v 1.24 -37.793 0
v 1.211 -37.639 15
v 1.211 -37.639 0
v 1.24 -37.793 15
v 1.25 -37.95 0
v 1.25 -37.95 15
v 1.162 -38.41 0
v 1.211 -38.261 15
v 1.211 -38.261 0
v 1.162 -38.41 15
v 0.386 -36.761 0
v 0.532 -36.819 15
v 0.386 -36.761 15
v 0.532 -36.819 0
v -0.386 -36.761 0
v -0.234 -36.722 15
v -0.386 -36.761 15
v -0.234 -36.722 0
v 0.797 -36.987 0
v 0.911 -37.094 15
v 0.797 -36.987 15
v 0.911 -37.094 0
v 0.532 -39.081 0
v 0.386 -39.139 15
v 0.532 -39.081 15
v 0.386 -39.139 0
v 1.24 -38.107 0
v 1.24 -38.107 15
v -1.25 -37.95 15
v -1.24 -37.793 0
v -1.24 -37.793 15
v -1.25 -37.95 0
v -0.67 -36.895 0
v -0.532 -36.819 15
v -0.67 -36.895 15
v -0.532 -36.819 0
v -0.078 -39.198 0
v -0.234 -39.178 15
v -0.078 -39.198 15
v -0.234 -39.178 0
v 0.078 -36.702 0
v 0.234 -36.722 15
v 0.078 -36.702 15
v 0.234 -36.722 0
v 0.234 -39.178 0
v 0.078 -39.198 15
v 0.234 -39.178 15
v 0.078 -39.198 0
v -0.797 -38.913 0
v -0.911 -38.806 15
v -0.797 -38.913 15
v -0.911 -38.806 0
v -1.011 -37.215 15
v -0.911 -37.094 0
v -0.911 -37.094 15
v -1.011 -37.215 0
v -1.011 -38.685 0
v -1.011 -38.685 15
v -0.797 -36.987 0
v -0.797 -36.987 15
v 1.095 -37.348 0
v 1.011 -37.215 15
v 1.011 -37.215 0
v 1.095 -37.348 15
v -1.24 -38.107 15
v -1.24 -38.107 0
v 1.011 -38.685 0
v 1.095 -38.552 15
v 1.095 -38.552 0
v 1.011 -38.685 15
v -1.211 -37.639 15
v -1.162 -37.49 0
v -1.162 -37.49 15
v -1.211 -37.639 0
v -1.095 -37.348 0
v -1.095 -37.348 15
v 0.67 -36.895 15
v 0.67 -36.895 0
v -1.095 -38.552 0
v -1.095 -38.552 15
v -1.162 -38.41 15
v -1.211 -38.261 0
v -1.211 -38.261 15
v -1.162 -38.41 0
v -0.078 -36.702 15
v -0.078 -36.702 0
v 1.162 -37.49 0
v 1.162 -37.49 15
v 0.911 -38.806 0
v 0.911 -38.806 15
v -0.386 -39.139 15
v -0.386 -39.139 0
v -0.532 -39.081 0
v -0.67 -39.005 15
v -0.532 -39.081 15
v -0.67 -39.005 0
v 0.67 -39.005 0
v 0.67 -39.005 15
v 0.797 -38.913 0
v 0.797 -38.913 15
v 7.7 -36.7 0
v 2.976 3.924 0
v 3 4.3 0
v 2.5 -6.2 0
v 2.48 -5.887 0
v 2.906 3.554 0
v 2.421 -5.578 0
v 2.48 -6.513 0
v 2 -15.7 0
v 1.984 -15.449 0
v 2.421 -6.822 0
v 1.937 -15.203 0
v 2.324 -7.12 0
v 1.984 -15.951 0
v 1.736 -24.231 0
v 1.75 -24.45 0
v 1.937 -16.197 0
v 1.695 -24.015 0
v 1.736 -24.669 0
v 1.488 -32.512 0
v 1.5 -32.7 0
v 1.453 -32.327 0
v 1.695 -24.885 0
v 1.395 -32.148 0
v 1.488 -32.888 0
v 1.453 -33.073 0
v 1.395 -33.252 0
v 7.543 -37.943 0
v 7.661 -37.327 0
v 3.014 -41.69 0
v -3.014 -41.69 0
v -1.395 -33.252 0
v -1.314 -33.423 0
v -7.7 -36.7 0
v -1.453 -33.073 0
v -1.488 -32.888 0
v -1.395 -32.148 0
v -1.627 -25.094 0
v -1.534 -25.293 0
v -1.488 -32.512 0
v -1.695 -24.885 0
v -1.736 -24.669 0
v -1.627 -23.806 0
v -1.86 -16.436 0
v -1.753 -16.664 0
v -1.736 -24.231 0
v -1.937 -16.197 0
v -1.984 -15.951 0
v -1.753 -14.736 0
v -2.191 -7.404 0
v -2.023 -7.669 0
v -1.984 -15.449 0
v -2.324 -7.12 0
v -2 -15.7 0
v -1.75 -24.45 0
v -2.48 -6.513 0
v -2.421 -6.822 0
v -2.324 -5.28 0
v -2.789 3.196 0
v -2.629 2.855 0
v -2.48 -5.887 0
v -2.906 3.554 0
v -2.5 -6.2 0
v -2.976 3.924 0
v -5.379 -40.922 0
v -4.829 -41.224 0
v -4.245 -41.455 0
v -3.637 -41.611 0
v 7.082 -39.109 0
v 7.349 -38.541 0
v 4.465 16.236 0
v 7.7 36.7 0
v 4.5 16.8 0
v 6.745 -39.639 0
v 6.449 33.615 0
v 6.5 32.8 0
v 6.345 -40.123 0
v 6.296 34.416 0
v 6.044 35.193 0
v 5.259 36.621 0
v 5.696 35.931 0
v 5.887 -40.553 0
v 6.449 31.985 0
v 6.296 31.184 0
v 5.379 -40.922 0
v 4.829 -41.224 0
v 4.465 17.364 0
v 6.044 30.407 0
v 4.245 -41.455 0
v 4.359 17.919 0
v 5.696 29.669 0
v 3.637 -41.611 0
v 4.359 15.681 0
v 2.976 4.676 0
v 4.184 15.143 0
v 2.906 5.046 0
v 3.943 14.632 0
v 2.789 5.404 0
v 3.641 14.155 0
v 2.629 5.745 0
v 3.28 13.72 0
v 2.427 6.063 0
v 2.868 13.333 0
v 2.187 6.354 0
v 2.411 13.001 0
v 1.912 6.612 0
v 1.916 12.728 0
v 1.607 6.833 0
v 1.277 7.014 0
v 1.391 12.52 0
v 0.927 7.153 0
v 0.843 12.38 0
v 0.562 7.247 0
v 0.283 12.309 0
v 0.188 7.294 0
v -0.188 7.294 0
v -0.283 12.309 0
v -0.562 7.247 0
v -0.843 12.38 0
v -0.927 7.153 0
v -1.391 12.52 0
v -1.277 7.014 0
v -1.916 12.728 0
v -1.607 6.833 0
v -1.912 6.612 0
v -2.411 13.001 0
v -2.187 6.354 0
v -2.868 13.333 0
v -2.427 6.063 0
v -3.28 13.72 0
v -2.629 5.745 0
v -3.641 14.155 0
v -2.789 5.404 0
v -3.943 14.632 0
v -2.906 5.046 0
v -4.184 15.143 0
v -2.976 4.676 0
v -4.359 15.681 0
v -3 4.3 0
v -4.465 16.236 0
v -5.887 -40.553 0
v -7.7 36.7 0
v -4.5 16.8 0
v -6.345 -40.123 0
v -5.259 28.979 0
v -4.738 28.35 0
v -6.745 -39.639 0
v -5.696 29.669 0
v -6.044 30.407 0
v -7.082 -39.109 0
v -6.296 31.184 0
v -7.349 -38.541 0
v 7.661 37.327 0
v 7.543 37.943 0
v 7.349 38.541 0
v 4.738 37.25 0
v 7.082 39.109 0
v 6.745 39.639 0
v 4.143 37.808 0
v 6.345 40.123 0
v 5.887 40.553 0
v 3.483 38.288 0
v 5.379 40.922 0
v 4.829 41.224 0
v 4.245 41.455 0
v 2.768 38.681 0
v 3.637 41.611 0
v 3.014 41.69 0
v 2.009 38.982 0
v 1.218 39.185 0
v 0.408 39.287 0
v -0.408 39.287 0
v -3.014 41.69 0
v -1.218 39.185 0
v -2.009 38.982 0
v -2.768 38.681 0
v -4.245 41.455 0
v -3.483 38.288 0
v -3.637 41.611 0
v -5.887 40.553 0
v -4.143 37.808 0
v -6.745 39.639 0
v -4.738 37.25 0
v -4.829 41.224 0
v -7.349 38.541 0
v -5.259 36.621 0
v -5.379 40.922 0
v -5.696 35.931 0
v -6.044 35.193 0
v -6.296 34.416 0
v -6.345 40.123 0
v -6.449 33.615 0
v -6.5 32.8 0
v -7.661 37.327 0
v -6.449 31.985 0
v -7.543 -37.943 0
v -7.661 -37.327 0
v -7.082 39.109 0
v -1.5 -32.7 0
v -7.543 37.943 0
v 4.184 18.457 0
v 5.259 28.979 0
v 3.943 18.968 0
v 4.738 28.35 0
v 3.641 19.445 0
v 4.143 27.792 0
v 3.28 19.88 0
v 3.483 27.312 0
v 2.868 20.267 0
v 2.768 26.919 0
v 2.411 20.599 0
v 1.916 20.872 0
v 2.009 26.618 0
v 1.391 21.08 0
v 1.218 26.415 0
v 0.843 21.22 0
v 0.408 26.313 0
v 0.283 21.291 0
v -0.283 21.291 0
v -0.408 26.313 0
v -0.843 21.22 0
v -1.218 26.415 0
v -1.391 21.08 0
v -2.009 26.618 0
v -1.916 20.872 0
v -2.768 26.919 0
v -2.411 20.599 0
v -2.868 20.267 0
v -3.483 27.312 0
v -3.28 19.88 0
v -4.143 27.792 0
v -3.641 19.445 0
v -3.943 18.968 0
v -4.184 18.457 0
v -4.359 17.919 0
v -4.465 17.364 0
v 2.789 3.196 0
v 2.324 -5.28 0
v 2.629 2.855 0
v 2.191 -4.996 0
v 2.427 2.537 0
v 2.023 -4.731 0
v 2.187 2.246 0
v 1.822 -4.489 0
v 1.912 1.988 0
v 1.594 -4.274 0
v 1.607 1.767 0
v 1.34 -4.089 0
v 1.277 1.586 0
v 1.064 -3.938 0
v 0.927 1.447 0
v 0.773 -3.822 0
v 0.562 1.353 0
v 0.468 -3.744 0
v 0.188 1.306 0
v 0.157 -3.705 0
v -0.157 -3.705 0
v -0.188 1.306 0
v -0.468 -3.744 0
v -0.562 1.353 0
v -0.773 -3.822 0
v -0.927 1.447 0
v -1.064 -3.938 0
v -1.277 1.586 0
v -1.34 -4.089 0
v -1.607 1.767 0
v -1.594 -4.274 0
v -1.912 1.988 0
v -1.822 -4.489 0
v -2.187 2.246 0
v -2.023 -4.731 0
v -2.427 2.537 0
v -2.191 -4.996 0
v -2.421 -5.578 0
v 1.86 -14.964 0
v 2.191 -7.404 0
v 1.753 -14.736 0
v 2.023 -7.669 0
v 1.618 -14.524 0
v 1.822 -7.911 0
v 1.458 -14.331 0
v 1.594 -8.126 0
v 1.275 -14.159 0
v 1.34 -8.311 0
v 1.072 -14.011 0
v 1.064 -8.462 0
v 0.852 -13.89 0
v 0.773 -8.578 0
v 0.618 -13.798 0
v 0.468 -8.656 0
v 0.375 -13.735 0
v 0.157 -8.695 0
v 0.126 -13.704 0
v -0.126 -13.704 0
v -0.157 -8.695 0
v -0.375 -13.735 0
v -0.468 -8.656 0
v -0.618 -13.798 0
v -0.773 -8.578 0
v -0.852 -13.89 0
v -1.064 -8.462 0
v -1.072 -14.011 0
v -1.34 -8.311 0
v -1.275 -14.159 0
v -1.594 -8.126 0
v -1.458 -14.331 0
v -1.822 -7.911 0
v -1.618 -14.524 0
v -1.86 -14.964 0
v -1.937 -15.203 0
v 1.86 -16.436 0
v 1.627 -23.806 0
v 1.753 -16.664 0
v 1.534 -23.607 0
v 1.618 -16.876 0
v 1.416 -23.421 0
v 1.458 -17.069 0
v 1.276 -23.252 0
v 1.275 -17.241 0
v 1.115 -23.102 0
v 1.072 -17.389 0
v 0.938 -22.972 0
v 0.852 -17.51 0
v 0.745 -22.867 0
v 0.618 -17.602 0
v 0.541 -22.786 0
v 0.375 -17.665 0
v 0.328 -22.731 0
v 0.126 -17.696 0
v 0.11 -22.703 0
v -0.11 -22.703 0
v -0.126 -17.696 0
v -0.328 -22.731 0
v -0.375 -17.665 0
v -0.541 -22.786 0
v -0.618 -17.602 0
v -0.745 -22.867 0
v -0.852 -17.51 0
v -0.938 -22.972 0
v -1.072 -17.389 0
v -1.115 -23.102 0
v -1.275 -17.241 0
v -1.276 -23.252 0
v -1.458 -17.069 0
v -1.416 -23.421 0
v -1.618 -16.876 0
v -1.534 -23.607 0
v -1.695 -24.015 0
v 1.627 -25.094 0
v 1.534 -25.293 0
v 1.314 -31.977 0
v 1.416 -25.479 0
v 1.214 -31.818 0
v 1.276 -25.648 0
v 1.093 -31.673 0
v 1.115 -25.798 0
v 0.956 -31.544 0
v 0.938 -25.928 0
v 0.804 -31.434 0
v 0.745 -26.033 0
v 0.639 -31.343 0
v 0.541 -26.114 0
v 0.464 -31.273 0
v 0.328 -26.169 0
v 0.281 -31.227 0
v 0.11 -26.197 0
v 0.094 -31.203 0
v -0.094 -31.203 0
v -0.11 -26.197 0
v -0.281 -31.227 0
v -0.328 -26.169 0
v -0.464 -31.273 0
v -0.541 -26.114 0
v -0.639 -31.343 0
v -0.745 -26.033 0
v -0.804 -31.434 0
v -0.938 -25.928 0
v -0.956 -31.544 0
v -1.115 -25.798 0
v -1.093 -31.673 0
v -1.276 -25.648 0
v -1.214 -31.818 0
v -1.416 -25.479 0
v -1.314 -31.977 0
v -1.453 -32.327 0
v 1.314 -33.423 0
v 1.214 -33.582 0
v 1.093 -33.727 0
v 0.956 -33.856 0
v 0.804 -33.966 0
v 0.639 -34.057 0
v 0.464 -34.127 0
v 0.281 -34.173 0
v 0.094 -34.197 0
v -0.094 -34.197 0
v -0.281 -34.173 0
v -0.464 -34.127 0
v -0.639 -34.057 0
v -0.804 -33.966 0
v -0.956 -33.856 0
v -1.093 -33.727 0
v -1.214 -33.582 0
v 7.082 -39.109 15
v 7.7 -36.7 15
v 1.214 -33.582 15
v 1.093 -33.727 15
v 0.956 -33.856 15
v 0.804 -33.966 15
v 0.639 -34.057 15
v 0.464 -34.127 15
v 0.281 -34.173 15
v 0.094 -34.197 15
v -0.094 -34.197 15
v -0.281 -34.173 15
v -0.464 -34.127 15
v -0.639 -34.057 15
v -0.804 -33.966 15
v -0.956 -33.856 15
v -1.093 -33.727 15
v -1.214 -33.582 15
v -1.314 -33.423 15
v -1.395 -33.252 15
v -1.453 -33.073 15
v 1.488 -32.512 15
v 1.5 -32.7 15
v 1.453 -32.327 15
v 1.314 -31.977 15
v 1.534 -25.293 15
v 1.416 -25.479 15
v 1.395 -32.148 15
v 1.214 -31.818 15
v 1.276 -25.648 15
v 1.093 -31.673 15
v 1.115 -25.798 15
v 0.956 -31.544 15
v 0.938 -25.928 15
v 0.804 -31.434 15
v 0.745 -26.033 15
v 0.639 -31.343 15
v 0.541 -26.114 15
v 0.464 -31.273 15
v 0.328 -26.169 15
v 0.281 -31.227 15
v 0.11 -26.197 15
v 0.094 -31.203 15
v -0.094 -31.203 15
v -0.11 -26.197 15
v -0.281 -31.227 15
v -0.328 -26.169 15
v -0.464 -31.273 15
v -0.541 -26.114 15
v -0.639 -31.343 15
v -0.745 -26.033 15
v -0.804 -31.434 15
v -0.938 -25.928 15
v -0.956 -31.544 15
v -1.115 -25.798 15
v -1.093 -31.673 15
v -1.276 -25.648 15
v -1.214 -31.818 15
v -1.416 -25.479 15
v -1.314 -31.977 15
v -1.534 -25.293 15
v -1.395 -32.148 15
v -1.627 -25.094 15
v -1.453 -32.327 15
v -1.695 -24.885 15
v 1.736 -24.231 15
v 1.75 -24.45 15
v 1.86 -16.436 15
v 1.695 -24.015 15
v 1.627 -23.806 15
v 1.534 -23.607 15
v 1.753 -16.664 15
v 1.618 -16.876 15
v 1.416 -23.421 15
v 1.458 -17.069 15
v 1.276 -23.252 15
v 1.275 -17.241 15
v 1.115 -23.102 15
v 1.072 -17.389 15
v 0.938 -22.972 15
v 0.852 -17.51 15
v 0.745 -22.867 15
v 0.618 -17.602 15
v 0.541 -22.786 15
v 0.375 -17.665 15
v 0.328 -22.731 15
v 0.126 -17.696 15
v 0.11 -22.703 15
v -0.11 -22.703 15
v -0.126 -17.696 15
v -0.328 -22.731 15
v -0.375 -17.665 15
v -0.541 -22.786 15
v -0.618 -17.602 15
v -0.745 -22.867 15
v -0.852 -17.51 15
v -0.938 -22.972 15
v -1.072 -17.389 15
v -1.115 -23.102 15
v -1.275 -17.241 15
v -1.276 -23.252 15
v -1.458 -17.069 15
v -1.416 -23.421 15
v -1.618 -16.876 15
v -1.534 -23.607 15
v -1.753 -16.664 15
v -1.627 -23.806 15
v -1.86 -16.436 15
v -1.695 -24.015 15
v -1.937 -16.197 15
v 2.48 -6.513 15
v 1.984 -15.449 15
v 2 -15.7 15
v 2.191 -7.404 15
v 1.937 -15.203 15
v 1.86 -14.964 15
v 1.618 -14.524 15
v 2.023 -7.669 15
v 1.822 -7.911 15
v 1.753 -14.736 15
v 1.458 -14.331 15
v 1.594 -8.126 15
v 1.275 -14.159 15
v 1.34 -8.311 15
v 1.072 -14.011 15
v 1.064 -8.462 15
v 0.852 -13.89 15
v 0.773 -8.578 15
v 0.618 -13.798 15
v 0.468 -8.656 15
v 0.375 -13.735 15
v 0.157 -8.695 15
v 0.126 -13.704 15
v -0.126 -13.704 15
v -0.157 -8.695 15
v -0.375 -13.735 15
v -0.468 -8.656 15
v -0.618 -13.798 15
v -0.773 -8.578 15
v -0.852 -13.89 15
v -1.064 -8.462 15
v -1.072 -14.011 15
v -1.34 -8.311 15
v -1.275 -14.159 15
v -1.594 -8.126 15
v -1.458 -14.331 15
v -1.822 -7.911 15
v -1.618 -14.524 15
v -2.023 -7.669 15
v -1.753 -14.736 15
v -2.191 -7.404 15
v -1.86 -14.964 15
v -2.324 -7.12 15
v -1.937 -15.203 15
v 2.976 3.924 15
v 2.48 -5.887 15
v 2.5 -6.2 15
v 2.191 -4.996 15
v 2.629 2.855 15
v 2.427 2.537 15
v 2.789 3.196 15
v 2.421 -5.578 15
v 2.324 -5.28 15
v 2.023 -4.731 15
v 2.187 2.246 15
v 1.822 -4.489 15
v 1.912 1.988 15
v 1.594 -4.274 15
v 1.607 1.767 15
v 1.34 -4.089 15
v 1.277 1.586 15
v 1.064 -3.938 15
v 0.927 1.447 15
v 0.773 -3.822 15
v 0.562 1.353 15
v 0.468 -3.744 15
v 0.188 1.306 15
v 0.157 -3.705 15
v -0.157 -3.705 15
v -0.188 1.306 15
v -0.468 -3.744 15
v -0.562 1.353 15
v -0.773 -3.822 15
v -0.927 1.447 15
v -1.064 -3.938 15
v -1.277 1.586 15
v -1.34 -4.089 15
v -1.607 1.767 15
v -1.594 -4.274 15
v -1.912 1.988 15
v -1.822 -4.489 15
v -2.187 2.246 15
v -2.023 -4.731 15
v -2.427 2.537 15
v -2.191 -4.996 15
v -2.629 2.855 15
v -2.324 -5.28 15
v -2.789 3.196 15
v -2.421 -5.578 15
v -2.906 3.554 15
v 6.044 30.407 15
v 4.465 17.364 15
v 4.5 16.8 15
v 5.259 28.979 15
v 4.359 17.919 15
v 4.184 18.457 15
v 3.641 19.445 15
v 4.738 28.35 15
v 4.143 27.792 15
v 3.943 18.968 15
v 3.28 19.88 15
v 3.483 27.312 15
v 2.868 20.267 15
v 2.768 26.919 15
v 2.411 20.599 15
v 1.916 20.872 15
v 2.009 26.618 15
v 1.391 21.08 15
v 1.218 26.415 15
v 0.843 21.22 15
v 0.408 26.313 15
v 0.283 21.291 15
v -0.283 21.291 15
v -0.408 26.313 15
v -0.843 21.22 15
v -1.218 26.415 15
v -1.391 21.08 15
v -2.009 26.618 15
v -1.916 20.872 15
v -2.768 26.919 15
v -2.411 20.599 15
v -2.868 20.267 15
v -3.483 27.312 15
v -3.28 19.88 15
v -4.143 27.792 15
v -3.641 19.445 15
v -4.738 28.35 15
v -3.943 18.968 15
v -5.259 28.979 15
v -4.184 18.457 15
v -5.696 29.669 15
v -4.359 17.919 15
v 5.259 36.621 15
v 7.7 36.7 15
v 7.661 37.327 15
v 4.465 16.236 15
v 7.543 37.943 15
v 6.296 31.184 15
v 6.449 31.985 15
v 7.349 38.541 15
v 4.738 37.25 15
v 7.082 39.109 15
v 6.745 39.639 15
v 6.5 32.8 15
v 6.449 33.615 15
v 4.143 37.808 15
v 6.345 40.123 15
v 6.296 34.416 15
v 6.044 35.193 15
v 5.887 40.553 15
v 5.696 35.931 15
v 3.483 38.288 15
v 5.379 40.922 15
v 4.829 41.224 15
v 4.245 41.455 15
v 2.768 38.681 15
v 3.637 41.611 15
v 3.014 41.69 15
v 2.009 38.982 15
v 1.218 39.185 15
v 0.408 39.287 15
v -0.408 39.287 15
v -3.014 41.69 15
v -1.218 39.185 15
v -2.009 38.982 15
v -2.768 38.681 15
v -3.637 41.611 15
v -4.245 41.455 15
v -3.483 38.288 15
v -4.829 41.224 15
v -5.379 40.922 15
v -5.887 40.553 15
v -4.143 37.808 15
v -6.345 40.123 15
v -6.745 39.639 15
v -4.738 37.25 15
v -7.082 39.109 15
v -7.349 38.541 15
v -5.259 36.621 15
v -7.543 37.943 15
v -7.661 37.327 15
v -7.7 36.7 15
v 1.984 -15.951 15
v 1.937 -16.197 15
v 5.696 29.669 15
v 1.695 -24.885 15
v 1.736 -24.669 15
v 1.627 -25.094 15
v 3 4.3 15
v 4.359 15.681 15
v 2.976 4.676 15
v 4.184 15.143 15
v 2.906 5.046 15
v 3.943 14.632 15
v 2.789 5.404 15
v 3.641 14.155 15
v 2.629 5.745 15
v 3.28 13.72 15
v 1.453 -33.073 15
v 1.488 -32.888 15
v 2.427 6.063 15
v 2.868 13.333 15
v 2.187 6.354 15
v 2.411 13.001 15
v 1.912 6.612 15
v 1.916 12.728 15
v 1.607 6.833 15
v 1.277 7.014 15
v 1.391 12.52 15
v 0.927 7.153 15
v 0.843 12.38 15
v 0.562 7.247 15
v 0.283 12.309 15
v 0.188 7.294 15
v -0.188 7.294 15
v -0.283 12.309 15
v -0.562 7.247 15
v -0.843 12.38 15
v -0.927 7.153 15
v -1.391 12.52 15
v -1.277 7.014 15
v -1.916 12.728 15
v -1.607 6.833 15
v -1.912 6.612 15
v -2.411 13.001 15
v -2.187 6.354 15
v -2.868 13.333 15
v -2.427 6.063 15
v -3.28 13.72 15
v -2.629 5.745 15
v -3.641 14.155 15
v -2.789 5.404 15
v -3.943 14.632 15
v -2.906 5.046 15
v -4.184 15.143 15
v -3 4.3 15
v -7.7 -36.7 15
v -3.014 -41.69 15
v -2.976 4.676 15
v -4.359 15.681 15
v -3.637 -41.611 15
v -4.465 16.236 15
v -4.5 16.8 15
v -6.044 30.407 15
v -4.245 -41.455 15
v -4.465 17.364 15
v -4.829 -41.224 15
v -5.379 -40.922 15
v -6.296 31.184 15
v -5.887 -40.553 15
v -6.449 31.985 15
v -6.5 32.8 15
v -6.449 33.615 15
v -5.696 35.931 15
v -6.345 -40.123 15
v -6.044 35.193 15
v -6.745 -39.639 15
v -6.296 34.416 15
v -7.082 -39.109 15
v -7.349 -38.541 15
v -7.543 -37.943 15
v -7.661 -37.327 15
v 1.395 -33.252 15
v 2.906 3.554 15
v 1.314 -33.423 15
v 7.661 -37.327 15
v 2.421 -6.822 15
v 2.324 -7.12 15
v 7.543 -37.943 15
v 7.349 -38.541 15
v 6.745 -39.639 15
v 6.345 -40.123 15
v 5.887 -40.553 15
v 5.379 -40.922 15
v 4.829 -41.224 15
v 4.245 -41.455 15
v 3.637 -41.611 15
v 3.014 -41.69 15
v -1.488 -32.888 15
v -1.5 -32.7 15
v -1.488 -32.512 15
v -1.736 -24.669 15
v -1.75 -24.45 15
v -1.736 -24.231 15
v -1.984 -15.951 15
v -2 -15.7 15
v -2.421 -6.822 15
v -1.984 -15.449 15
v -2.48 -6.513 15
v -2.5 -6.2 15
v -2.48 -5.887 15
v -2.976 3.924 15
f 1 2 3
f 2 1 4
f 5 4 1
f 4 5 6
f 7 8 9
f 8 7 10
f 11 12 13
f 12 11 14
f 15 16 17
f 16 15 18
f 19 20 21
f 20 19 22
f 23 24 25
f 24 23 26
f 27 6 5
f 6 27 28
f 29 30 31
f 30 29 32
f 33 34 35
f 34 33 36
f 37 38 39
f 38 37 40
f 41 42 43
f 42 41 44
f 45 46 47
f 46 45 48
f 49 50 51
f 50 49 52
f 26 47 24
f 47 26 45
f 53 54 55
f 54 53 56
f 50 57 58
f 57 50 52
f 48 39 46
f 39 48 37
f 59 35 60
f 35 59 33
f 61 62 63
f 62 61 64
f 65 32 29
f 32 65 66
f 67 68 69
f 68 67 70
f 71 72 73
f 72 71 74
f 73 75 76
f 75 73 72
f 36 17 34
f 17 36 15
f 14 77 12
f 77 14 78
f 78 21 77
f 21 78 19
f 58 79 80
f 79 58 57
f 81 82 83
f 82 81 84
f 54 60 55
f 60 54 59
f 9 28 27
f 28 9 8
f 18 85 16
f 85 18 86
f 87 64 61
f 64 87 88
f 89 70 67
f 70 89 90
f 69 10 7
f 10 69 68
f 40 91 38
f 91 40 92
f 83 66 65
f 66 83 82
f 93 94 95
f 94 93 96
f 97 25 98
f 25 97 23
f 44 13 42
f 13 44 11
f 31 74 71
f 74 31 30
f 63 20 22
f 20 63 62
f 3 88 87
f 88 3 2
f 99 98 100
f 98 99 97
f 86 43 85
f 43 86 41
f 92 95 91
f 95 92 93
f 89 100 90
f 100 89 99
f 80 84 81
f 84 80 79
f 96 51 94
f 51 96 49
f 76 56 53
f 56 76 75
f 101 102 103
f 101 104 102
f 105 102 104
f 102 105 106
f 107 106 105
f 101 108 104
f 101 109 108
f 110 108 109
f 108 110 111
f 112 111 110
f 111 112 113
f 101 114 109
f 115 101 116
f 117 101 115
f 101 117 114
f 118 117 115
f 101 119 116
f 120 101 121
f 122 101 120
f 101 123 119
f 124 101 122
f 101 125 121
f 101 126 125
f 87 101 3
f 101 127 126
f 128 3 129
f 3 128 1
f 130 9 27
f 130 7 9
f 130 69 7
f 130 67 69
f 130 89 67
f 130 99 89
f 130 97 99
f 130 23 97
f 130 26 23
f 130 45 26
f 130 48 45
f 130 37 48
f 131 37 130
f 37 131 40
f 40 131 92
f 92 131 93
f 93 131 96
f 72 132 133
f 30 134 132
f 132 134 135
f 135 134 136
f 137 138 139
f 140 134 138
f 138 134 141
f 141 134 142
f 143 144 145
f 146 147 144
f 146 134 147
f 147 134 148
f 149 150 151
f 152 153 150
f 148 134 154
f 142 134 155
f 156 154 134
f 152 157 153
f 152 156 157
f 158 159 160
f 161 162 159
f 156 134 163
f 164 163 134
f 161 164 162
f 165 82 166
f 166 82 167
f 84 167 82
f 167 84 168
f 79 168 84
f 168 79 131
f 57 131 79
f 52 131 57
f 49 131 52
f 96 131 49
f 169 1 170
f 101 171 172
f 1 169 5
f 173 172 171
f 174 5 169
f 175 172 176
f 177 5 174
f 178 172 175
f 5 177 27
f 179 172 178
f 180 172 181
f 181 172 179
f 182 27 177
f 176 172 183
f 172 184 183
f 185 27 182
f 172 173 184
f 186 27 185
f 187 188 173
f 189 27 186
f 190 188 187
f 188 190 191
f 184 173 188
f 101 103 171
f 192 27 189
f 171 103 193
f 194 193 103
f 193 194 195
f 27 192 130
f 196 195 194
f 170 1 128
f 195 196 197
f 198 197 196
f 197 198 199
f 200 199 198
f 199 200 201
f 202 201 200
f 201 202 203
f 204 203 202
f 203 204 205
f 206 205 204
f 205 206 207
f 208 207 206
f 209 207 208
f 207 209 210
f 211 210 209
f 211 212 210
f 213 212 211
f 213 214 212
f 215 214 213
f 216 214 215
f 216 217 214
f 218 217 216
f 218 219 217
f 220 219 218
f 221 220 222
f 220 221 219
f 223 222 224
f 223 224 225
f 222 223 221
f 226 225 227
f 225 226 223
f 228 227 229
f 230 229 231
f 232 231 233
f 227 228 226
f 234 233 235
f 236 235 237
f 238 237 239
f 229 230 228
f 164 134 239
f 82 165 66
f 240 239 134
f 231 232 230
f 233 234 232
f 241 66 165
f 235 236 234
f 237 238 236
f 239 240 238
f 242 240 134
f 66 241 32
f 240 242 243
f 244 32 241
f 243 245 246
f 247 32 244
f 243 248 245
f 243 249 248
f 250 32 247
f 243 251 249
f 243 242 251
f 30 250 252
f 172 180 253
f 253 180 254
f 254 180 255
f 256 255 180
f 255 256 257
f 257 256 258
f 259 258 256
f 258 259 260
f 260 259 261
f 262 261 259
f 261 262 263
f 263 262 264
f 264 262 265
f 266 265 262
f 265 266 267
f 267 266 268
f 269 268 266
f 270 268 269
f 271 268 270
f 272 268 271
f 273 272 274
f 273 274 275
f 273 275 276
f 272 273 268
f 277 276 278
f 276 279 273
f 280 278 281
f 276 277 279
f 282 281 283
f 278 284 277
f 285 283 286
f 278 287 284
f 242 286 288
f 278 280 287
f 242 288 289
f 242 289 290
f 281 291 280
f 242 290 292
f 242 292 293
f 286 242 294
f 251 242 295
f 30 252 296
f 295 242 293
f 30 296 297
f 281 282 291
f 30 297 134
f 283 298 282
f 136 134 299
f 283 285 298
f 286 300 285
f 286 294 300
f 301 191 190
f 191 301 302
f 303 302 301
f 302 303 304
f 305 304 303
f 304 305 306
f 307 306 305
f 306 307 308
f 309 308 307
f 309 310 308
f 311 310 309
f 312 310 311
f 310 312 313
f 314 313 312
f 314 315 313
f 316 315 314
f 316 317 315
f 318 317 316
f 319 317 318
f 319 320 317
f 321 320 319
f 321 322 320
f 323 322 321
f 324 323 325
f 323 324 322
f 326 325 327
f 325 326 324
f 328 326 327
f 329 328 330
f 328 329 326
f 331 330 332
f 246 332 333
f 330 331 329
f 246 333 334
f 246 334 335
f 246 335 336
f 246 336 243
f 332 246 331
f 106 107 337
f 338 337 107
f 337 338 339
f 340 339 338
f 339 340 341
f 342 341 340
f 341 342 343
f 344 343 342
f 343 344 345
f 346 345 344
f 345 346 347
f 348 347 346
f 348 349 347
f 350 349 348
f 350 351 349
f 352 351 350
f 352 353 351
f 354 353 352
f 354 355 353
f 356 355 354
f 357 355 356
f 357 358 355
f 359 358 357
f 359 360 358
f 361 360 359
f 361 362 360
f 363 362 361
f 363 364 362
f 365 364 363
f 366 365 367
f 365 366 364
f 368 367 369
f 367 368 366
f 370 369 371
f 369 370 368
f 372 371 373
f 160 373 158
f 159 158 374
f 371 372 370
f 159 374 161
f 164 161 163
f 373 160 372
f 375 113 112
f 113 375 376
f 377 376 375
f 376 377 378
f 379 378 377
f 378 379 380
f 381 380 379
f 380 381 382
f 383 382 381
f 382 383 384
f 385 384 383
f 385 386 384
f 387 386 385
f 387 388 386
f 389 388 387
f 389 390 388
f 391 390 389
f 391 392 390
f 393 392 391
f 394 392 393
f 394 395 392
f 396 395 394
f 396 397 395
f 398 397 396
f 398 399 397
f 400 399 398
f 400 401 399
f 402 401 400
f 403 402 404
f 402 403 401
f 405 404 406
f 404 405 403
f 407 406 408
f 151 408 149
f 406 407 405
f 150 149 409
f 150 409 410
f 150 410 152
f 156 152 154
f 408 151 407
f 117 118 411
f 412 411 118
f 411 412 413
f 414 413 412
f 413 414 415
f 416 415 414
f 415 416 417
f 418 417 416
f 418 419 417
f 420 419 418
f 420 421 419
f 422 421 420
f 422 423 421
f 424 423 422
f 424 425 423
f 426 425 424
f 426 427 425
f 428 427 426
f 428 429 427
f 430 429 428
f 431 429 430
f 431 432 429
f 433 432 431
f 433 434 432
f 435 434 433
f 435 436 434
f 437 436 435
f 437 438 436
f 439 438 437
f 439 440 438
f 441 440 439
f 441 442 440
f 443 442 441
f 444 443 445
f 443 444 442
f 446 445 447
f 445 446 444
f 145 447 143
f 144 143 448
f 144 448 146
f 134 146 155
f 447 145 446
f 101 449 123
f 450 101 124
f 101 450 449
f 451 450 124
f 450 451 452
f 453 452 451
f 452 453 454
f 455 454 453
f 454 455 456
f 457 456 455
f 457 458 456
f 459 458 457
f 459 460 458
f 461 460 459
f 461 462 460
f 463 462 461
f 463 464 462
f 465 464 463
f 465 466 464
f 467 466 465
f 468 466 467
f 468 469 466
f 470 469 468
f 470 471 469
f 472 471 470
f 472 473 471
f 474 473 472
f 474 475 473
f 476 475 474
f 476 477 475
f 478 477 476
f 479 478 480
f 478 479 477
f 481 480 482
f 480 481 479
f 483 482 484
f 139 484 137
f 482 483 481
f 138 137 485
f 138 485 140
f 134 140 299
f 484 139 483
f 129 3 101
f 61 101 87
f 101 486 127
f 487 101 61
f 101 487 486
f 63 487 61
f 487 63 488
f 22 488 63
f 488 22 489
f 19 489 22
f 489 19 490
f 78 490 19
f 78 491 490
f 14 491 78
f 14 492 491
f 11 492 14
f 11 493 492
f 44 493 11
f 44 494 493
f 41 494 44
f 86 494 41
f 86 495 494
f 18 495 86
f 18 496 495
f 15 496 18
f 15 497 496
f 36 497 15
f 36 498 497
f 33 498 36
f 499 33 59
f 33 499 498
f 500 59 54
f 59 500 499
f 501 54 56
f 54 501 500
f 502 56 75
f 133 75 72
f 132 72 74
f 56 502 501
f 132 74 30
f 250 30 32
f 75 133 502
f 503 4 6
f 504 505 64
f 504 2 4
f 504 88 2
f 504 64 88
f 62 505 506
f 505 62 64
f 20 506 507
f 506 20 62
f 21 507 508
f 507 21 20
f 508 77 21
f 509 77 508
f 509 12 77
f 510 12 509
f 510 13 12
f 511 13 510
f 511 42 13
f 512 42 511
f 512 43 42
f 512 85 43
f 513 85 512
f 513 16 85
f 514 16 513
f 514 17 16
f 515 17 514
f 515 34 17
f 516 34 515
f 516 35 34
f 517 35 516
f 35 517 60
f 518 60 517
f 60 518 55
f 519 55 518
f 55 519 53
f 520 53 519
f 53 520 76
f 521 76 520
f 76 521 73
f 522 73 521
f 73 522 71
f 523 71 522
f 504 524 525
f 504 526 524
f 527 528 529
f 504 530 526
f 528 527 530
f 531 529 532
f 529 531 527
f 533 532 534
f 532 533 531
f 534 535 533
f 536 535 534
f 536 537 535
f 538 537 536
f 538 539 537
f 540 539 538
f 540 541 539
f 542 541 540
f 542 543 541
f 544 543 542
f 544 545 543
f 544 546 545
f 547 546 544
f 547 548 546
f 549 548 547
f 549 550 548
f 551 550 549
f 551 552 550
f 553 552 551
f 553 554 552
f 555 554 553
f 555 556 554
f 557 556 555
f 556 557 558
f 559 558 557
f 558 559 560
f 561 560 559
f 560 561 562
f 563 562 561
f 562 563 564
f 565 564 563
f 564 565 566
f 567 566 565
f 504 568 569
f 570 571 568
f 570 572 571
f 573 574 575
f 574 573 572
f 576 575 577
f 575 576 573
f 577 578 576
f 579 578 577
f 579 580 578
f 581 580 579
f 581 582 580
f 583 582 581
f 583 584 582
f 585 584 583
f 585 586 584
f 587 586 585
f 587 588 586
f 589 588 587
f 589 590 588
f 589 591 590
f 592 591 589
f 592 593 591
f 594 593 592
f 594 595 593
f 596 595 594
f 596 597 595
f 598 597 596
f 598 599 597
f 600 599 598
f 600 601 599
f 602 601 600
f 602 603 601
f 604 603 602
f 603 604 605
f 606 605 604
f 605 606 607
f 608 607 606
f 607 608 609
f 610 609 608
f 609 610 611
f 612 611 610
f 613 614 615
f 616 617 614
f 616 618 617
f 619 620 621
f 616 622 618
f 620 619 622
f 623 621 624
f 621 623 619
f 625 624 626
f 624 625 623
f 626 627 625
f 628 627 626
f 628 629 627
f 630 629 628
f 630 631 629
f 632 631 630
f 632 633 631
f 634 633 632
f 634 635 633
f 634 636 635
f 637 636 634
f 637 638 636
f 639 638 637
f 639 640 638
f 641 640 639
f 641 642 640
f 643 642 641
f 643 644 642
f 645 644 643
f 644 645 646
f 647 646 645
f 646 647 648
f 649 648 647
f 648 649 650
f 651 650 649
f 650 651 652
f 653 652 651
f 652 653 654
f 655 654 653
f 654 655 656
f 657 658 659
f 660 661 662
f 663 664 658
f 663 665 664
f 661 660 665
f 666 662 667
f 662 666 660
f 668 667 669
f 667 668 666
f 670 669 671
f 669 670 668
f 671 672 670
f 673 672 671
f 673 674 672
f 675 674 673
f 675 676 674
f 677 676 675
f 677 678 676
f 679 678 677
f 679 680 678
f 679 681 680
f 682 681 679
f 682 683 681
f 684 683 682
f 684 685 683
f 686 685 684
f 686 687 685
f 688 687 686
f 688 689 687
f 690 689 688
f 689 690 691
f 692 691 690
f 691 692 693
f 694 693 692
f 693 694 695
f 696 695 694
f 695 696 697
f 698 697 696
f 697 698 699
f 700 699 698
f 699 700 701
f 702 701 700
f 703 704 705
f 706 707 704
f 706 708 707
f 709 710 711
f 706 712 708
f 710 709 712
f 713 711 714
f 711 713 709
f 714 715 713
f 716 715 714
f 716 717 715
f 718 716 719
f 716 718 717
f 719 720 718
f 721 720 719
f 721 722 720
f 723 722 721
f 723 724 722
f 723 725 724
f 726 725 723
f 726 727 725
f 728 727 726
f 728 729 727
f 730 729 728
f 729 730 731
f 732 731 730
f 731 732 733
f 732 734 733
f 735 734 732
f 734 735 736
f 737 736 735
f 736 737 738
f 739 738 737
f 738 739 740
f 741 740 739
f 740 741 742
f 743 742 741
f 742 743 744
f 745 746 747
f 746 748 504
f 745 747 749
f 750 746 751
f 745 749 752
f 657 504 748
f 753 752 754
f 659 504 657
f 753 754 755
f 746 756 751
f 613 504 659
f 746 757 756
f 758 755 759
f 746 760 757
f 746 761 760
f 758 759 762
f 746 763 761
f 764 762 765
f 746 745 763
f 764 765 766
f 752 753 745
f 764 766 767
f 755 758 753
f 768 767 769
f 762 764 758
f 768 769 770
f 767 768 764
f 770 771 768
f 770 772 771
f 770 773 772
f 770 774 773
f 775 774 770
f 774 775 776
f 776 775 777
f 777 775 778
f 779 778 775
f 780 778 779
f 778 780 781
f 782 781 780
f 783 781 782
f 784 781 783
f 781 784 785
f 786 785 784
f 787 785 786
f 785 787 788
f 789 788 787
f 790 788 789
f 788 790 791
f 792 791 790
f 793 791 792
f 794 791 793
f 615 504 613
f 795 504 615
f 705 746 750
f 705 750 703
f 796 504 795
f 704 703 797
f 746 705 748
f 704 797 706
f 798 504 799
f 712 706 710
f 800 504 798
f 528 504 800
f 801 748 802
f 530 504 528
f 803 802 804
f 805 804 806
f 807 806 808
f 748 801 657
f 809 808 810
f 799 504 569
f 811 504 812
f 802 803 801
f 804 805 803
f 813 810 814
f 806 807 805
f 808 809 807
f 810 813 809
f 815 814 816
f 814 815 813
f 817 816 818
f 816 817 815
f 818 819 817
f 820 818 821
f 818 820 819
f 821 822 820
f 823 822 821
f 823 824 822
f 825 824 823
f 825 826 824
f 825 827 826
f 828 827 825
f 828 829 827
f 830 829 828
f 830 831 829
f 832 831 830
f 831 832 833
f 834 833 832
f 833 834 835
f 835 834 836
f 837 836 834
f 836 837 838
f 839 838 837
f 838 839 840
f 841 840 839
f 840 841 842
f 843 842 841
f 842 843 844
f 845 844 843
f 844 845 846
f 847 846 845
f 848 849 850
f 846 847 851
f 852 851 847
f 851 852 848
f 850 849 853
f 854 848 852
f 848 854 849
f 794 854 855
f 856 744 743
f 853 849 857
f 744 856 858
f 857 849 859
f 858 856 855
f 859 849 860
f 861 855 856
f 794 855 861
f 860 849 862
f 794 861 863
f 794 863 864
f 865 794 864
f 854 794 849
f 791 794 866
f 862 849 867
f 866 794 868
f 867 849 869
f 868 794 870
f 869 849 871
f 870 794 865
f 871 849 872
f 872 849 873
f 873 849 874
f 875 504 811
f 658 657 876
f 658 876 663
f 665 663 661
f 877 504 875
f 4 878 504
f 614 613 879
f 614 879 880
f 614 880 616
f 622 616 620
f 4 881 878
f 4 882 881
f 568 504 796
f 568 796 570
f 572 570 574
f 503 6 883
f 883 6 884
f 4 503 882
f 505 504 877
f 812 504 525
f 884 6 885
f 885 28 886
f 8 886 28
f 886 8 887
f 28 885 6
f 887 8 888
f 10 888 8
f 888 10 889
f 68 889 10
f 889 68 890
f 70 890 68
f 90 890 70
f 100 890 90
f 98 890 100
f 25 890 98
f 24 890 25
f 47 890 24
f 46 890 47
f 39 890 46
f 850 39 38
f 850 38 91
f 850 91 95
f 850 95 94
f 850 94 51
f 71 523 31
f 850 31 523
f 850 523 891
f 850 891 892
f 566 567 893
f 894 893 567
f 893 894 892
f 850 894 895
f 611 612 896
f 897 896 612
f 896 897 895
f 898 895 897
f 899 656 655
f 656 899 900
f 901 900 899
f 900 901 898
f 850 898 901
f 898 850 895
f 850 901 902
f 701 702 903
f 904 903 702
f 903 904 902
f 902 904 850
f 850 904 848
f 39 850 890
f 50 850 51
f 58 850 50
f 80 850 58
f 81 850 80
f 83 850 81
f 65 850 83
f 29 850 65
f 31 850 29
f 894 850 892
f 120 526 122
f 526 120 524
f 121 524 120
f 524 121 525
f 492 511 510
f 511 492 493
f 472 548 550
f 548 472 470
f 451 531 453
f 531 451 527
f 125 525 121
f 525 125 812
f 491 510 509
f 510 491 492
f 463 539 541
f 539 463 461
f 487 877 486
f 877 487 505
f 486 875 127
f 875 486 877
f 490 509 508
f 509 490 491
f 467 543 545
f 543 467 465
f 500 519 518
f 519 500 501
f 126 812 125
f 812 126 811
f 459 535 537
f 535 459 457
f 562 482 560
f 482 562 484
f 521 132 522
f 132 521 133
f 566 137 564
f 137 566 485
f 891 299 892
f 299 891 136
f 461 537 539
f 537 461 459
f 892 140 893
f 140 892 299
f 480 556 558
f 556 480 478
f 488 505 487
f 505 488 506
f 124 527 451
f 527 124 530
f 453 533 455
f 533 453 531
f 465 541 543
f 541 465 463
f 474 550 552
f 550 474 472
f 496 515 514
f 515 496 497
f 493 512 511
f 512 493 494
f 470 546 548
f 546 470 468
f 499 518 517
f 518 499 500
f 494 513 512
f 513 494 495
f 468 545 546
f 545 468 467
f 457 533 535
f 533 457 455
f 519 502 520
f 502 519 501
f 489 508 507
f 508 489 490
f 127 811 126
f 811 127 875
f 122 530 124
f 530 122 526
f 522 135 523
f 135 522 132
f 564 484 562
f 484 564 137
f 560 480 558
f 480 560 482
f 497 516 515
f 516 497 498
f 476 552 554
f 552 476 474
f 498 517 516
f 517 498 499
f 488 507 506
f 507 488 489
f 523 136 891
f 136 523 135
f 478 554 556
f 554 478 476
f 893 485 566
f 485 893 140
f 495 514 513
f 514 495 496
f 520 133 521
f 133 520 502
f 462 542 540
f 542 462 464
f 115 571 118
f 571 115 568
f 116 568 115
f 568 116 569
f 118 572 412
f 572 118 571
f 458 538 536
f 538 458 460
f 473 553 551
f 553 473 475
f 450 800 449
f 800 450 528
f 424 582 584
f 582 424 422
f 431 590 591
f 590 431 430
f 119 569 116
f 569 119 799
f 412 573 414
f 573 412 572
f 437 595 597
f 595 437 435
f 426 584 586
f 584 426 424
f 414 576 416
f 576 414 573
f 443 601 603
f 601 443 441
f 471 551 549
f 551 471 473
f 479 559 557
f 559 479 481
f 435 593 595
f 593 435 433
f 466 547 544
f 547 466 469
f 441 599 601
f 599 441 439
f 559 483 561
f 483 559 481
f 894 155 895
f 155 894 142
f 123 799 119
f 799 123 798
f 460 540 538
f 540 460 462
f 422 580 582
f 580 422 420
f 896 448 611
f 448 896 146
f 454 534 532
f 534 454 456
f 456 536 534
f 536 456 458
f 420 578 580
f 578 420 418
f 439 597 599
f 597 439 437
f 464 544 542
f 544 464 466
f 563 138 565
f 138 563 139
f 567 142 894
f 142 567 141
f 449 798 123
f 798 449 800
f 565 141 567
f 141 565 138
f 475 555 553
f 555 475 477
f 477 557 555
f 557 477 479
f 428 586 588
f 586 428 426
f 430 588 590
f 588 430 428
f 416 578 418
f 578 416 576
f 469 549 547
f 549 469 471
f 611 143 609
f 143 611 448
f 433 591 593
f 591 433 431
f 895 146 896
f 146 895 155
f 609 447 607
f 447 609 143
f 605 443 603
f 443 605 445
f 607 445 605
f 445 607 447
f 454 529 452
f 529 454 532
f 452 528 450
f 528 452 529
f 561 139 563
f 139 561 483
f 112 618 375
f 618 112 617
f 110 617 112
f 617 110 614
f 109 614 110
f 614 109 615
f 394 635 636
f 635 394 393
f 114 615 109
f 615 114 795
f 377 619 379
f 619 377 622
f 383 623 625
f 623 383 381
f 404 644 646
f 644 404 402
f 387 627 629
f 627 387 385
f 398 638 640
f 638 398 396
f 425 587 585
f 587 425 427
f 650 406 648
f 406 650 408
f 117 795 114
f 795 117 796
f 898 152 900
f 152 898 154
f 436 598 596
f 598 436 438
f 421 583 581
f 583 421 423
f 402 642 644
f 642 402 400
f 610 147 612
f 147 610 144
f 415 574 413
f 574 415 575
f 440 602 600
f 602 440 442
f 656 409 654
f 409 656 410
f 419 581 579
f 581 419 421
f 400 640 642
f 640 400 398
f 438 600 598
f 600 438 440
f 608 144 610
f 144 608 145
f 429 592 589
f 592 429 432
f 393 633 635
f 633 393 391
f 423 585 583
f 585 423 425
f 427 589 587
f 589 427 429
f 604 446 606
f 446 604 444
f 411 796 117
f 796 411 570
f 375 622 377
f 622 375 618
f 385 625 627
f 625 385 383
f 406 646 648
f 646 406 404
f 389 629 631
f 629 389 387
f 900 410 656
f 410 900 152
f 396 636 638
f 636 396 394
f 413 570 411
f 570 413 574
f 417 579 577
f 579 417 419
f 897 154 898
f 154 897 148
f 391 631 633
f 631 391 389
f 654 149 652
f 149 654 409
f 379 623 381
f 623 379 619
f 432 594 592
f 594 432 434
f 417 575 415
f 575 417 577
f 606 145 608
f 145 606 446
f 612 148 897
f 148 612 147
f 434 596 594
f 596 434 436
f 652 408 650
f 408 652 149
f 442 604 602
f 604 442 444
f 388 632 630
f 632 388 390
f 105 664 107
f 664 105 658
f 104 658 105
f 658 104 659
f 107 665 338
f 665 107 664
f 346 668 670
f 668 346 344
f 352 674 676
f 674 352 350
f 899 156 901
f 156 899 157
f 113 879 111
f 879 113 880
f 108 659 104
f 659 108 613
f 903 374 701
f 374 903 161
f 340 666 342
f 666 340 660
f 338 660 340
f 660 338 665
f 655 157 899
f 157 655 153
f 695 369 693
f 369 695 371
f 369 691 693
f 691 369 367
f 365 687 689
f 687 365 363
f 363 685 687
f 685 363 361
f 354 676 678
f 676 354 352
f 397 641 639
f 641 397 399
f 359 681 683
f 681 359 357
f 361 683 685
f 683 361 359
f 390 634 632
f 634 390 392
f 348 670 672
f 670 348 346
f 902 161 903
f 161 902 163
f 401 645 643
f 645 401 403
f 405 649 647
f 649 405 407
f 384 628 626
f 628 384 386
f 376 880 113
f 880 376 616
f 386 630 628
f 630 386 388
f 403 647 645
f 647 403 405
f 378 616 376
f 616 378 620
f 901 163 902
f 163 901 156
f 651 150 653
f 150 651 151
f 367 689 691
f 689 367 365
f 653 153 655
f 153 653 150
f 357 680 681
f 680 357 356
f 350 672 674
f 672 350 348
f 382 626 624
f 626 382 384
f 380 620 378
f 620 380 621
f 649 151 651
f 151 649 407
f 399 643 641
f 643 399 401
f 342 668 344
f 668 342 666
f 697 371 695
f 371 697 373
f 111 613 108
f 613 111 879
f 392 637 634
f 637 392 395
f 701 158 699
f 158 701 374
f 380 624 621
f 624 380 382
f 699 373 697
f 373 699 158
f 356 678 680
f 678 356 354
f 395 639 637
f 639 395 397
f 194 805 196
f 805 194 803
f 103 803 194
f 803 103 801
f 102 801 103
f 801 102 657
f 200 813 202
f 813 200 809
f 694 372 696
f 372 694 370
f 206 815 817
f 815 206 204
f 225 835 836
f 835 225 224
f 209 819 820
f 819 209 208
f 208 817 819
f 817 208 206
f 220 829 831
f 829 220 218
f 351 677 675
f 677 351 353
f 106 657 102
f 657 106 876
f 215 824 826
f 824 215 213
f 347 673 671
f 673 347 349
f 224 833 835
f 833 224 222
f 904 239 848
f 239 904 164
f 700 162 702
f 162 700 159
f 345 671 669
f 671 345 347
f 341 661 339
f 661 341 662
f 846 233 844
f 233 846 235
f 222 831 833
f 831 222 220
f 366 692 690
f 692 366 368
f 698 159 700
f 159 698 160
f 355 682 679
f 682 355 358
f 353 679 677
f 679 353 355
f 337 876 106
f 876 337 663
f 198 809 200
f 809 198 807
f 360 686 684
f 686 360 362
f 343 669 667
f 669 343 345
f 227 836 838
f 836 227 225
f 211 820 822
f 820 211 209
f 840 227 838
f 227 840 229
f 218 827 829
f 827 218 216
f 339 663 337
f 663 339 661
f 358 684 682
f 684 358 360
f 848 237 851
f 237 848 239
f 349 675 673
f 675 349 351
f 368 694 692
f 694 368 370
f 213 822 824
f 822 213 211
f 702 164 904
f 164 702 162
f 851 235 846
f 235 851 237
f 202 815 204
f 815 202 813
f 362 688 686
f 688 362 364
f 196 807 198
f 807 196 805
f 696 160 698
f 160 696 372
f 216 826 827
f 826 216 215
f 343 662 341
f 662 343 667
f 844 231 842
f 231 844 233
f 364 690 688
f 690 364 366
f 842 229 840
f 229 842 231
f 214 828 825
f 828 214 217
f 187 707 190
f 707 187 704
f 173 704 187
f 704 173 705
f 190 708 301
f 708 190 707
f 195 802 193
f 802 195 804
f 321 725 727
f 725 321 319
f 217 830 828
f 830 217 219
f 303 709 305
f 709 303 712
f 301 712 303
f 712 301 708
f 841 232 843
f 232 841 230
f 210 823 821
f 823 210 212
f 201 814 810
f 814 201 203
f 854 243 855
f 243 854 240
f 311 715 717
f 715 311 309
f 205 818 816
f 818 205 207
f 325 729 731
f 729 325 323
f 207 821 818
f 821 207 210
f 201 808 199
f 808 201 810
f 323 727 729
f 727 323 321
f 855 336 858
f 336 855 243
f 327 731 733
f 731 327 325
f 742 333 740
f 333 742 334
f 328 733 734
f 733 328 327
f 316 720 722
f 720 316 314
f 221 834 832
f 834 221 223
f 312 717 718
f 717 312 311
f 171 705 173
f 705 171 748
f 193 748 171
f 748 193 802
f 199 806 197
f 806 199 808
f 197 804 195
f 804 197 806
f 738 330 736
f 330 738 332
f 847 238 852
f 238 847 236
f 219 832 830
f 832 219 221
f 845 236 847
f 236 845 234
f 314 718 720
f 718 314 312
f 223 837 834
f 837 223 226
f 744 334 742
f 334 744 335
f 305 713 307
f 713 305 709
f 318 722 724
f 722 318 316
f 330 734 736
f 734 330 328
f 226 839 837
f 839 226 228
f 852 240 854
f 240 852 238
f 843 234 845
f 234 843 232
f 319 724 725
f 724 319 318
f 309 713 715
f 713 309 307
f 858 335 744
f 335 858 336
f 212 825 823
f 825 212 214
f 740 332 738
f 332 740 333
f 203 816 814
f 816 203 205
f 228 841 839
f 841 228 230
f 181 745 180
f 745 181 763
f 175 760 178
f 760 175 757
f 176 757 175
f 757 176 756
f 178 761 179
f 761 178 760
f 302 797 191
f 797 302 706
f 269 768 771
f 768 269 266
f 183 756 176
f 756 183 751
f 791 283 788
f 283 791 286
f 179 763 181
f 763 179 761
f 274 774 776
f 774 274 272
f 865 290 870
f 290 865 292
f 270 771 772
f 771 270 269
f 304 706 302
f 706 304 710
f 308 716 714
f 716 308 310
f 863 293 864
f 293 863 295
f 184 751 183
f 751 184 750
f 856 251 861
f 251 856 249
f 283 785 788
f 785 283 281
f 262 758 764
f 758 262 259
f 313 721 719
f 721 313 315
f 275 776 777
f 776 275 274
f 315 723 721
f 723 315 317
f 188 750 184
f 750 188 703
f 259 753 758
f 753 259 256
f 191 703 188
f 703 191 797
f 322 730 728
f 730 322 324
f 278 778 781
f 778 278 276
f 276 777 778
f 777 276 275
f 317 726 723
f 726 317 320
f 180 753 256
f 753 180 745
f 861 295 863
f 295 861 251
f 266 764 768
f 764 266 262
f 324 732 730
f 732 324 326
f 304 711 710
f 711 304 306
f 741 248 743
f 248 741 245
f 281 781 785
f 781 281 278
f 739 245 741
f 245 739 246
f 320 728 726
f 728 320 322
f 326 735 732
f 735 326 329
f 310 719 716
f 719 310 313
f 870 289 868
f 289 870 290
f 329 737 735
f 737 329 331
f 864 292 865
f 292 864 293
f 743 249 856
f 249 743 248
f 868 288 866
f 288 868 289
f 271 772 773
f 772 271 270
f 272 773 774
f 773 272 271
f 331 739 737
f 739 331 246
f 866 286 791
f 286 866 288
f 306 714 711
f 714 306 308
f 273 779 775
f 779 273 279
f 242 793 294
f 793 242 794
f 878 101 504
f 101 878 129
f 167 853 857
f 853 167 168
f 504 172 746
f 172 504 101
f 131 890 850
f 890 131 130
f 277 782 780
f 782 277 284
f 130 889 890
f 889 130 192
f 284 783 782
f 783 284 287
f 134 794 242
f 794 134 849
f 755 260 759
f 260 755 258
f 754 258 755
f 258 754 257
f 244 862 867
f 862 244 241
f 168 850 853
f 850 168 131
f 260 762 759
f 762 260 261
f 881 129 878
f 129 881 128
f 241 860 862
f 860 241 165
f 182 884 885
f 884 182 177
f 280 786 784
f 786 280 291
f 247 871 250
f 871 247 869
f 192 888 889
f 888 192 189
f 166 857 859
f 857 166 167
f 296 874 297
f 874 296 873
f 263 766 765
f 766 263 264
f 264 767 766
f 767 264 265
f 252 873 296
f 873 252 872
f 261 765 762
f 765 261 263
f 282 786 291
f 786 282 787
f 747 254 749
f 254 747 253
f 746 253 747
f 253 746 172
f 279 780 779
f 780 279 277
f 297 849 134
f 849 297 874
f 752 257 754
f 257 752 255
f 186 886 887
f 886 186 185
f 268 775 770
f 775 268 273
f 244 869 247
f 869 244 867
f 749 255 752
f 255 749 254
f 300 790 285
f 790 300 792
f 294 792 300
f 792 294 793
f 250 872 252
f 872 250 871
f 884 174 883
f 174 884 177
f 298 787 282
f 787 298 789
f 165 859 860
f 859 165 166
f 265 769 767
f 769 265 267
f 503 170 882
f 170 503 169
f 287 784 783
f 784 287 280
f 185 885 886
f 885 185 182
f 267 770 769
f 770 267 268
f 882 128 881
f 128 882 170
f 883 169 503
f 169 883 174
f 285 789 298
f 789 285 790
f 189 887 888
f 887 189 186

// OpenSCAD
TOOL_SIZES = [2.5, 3, 3.5, 4, 5, 6, 9, 13];
SPACING = 5;
WALL_THICKNESS = 1.2;
CORNER_DIA = 10;
HEIGHT = 15;
WIDTH = max(TOOL_SIZES) + 2 * WALL_THICKNESS;
LENGTH = (len(TOOL_SIZES) - 1) * SPACING + sum(TOOL_SIZES, len(TOOL_SIZES)) + 2 * WALL_THICKNESS;

$fn = 50;

function sum(list, length, i = 0) =
  i < length - 1 ? list[i] + sum(list, length, i + 1) : list[i];

module rounded_rect(width, length, height, corner_dia) {
    hull() {
        for(i = [-1, 1]) {
            for(j = [-1, 1]) {
                translate([i * (width-corner_dia)/2, j * (length-corner_dia)/2, 0])
                cylinder(d = corner_dia, h = height);
            }
        }
    }
}


difference() {
    rounded_rect(WIDTH, LENGTH, HEIGHT, CORNER_DIA);

    for(i = [0:len(TOOL_SIZES)-1]) {
        translate([0, -LENGTH/2 + i * SPACING + sum(TOOL_SIZES, i) + TOOL_SIZES[i]/2, 0])
        cylinder(d = TOOL_SIZES[i], h = HEIGHT);
    }
}
